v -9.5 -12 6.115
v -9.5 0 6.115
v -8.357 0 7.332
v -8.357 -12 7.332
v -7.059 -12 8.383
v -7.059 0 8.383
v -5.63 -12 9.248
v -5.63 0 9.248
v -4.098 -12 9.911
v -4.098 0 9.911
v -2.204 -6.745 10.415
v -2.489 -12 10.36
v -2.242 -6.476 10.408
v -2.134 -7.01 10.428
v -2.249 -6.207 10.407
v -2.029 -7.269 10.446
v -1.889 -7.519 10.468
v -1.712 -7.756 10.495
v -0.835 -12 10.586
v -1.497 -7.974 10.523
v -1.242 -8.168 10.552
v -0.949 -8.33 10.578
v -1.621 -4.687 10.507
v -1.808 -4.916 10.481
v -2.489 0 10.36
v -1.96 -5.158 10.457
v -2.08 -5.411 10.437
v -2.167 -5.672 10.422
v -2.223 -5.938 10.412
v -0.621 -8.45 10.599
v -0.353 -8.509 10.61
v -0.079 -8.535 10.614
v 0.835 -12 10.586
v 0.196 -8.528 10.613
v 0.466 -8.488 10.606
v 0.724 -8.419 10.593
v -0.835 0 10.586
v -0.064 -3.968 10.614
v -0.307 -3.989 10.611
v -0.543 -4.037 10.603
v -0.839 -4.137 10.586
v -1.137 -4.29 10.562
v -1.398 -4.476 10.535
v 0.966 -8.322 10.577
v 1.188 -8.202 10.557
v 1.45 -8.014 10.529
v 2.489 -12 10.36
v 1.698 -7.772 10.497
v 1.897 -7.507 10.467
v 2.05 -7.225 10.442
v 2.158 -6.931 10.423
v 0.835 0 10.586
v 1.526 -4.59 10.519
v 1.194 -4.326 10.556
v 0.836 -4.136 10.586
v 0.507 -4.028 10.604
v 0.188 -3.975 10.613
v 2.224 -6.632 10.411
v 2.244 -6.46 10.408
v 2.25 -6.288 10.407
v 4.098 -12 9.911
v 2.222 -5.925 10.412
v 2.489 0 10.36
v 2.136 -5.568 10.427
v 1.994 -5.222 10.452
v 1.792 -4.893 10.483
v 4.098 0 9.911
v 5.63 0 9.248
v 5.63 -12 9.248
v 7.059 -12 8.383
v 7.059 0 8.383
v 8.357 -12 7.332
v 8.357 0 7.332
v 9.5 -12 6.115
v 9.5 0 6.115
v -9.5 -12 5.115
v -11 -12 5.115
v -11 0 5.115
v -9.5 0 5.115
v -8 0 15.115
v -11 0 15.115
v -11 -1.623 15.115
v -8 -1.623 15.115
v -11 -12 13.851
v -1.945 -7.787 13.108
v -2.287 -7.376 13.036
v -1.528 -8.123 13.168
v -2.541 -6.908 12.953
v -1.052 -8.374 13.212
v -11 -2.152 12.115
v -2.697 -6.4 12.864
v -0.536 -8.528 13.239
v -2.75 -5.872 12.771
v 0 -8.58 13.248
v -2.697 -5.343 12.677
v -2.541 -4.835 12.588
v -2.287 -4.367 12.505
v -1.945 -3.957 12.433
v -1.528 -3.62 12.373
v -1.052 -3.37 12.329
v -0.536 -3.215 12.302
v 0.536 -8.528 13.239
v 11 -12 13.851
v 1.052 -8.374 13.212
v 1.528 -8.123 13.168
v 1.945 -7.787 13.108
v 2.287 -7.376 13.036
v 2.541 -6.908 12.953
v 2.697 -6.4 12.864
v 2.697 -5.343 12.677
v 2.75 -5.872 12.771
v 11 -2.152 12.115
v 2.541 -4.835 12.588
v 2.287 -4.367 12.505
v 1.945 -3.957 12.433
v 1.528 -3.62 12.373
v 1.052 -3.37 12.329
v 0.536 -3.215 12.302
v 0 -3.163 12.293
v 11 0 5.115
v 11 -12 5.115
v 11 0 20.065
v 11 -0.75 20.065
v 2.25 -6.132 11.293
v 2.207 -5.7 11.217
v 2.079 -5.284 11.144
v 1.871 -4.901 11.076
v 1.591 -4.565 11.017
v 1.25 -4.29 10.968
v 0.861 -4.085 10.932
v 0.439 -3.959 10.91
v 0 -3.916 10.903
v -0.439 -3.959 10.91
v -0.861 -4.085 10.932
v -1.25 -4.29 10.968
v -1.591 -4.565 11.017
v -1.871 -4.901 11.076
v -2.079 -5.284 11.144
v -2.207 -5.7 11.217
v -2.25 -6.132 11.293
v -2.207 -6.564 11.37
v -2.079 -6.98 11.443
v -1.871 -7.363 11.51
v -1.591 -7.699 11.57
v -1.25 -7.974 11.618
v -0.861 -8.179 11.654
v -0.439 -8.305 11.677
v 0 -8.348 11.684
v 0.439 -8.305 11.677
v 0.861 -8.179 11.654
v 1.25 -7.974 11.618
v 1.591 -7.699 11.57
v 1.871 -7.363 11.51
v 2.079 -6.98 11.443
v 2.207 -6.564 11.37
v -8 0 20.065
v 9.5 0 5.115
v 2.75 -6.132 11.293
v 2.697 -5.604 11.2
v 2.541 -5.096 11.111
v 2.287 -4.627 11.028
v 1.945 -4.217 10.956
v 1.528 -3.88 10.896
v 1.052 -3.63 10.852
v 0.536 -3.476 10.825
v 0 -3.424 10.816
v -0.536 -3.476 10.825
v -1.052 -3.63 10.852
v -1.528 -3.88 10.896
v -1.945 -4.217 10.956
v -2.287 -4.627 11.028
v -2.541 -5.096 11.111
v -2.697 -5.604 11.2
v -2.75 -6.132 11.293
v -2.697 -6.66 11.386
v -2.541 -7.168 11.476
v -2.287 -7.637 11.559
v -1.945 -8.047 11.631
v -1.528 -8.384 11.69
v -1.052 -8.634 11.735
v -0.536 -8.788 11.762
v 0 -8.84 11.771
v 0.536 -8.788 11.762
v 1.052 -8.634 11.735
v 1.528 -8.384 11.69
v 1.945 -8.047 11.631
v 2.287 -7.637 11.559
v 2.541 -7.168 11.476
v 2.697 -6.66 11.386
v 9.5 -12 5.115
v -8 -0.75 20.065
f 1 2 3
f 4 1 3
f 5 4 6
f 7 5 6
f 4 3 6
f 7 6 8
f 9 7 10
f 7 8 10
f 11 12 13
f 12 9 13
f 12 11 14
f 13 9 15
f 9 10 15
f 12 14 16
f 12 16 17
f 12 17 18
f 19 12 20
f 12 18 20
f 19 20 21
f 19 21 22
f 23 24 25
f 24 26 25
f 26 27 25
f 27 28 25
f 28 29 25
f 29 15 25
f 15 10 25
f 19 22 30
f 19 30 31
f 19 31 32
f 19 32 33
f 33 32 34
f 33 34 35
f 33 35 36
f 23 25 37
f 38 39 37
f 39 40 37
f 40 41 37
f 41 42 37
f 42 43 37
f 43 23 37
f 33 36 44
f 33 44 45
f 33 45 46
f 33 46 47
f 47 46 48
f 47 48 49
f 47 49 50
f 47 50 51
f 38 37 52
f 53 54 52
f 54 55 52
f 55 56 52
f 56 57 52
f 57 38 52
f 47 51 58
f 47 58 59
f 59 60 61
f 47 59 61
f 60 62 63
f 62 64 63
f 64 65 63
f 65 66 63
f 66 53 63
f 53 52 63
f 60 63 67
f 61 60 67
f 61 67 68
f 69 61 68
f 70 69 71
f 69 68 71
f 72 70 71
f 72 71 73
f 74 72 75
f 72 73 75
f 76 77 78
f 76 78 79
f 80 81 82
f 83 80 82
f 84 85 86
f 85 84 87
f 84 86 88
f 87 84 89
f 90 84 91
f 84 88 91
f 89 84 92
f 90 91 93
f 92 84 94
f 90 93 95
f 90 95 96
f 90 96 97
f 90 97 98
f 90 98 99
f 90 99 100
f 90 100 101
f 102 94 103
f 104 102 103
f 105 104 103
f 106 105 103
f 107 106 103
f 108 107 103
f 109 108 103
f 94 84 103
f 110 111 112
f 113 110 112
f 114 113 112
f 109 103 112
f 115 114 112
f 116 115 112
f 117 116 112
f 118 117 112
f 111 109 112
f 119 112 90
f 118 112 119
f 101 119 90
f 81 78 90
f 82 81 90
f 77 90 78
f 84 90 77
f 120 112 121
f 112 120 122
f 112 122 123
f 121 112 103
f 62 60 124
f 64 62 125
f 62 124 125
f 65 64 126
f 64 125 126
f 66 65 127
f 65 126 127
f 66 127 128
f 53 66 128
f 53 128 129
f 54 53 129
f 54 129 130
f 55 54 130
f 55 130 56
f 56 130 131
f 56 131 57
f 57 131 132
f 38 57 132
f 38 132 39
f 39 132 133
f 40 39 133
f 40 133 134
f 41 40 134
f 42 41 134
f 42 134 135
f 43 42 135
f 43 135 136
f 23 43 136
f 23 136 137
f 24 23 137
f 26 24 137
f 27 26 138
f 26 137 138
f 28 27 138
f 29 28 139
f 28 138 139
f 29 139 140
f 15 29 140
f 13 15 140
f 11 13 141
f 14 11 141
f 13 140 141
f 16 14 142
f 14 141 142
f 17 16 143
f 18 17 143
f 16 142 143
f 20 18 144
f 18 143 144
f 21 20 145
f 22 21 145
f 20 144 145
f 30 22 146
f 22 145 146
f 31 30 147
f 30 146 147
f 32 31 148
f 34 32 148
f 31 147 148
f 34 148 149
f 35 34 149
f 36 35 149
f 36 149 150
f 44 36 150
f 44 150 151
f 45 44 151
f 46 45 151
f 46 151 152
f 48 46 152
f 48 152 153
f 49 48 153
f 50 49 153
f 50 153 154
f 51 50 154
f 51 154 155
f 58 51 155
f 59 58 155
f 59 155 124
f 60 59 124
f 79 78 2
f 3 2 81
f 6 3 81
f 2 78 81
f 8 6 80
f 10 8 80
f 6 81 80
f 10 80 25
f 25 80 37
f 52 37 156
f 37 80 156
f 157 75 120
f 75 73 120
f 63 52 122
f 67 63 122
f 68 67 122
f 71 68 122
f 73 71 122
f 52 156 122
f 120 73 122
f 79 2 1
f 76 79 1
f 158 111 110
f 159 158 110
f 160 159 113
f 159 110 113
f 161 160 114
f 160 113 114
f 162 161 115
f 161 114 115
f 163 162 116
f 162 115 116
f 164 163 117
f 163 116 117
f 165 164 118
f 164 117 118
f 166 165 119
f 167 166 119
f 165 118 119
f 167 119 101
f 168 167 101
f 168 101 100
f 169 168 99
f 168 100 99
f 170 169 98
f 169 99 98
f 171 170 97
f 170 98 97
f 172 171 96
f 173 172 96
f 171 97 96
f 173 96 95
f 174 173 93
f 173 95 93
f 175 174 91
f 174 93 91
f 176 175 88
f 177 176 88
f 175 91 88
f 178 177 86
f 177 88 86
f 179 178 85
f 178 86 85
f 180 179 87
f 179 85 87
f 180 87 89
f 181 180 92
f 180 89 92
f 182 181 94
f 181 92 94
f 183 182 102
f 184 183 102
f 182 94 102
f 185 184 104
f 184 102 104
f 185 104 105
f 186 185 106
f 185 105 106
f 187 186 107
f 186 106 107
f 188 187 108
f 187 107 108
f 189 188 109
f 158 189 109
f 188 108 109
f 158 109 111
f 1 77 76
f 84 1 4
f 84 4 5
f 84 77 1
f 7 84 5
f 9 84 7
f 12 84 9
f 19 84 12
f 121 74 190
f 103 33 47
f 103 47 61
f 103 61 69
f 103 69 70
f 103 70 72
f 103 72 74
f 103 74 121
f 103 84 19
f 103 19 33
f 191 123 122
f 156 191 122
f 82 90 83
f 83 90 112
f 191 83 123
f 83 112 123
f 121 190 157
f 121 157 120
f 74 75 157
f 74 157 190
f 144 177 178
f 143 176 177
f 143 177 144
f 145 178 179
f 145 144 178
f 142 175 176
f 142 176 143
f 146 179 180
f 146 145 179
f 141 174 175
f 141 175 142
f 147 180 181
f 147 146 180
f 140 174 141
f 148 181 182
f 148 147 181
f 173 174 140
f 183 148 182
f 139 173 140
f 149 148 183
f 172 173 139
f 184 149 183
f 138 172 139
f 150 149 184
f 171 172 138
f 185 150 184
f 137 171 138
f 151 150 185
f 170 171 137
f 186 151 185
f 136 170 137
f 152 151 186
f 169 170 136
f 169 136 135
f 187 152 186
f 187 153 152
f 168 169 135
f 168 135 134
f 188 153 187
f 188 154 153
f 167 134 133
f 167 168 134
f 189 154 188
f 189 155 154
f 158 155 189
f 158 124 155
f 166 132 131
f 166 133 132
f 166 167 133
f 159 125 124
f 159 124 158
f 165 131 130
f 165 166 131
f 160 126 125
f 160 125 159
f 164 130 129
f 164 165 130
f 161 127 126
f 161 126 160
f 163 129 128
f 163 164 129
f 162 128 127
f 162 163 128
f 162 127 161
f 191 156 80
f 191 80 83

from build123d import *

# Parameters (mm, degrees)
F1_DEPTH  = 12
F3_DEPTH  = 22.001
F5_DEPTH  = 3
F6_W      = 1.5
F6_H      = 12
F7_DEPTH  = 1
F8_W      = 1.5
F8_H      = 12
F9_DEPTH  = 1
F10_R     = 2.75
F11_DEPTH = 1.5
F12_R     = 2.25
F13_DEPTH = 25


with BuildPart() as f1:
    # F0 (on Front) → F1 (new body)
    with BuildSketch(Plane.XZ):
        with BuildLine():
            ThreePointArc((-9.5, 6.1146484713), (0, 10.6146484713), (9.5, 6.1146484713))
            Line((9.5, 6.1146484713), (11, 6.1146484713))
            Line((11, 6.1146484713), (11, 21.1146484713))
            Line((11, 21.1146484713), (-11, 21.1146484713))
            Line((-11, 21.1146484713), (-11, 6.1146484713))
            Line((-11, 6.1146484713), (-9.5, 6.1146484713))
        make_face()
    extrude(amount=F1_DEPTH)

    # F2 (on face) → F3 (cut, through all)
    with BuildSketch(Plane.YZ.offset(11)):
        Polygon((-12, 21.1146484713), (-12, 13.851130248), (-2.1519224699, 12.1146484713), (-0.75, 20.0653458872), (0, 20.0653458872), (0, 21.1146484713), align=None)
    extrude(amount=-F3_DEPTH, mode=Mode.SUBTRACT)

    # F4 (on face) → F5 (cut)
    with BuildSketch(Plane(origin=(-11, 0, 0), x_dir=(0, -1, 0), z_dir=(-1, 0, 0))):
        Polygon((0.75, 20.0653458872), (0, 20.0653458872), (0, 15.1146484713), (1.6229415278, 15.1146484713), align=None)
    extrude(amount=-F5_DEPTH, mode=Mode.SUBTRACT)

    # F6 (on face) → F7 (join)
    with BuildSketch(Plane(origin=(0, 0, 6.1146484713), x_dir=(1, 0, 0), z_dir=(0, 0, -1))):
        with Locations((-10.25, 6)):
            Rectangle(F6_W, F6_H)
    extrude(amount=F7_DEPTH)

    # F8 (on face) → F9 (join)
    with BuildSketch(Plane(origin=(0, 0, 6.1146484713), x_dir=(1, 0, 0), z_dir=(0, 0, -1))):
        with Locations((10.25, 6)):
            Rectangle(F8_W, F8_H)
    extrude(amount=F9_DEPTH)

    # F10 (on face) → F11 (cut)
    with BuildSketch(Plane(origin=(0, 2.006838501, 11.3813467058), x_dir=(1, 0, 0), z_dir=(0, 0.1736481777, 0.984807753))):
        with Locations((0, -8)):
            Circle(F10_R)
    extrude(amount=-F11_DEPTH, mode=Mode.SUBTRACT)

    # F12 (on face) → F13 (cut)
    with BuildSketch(Plane(origin=(0, 1.7463662345, 9.9041350763), x_dir=(1, 0, 0), z_dir=(0, 0.1736481777, 0.984807753))):
        with Locations((0, -8)):
            Circle(F12_R)
    extrude(amount=-F13_DEPTH, mode=Mode.SUBTRACT)


solid = f1.part
